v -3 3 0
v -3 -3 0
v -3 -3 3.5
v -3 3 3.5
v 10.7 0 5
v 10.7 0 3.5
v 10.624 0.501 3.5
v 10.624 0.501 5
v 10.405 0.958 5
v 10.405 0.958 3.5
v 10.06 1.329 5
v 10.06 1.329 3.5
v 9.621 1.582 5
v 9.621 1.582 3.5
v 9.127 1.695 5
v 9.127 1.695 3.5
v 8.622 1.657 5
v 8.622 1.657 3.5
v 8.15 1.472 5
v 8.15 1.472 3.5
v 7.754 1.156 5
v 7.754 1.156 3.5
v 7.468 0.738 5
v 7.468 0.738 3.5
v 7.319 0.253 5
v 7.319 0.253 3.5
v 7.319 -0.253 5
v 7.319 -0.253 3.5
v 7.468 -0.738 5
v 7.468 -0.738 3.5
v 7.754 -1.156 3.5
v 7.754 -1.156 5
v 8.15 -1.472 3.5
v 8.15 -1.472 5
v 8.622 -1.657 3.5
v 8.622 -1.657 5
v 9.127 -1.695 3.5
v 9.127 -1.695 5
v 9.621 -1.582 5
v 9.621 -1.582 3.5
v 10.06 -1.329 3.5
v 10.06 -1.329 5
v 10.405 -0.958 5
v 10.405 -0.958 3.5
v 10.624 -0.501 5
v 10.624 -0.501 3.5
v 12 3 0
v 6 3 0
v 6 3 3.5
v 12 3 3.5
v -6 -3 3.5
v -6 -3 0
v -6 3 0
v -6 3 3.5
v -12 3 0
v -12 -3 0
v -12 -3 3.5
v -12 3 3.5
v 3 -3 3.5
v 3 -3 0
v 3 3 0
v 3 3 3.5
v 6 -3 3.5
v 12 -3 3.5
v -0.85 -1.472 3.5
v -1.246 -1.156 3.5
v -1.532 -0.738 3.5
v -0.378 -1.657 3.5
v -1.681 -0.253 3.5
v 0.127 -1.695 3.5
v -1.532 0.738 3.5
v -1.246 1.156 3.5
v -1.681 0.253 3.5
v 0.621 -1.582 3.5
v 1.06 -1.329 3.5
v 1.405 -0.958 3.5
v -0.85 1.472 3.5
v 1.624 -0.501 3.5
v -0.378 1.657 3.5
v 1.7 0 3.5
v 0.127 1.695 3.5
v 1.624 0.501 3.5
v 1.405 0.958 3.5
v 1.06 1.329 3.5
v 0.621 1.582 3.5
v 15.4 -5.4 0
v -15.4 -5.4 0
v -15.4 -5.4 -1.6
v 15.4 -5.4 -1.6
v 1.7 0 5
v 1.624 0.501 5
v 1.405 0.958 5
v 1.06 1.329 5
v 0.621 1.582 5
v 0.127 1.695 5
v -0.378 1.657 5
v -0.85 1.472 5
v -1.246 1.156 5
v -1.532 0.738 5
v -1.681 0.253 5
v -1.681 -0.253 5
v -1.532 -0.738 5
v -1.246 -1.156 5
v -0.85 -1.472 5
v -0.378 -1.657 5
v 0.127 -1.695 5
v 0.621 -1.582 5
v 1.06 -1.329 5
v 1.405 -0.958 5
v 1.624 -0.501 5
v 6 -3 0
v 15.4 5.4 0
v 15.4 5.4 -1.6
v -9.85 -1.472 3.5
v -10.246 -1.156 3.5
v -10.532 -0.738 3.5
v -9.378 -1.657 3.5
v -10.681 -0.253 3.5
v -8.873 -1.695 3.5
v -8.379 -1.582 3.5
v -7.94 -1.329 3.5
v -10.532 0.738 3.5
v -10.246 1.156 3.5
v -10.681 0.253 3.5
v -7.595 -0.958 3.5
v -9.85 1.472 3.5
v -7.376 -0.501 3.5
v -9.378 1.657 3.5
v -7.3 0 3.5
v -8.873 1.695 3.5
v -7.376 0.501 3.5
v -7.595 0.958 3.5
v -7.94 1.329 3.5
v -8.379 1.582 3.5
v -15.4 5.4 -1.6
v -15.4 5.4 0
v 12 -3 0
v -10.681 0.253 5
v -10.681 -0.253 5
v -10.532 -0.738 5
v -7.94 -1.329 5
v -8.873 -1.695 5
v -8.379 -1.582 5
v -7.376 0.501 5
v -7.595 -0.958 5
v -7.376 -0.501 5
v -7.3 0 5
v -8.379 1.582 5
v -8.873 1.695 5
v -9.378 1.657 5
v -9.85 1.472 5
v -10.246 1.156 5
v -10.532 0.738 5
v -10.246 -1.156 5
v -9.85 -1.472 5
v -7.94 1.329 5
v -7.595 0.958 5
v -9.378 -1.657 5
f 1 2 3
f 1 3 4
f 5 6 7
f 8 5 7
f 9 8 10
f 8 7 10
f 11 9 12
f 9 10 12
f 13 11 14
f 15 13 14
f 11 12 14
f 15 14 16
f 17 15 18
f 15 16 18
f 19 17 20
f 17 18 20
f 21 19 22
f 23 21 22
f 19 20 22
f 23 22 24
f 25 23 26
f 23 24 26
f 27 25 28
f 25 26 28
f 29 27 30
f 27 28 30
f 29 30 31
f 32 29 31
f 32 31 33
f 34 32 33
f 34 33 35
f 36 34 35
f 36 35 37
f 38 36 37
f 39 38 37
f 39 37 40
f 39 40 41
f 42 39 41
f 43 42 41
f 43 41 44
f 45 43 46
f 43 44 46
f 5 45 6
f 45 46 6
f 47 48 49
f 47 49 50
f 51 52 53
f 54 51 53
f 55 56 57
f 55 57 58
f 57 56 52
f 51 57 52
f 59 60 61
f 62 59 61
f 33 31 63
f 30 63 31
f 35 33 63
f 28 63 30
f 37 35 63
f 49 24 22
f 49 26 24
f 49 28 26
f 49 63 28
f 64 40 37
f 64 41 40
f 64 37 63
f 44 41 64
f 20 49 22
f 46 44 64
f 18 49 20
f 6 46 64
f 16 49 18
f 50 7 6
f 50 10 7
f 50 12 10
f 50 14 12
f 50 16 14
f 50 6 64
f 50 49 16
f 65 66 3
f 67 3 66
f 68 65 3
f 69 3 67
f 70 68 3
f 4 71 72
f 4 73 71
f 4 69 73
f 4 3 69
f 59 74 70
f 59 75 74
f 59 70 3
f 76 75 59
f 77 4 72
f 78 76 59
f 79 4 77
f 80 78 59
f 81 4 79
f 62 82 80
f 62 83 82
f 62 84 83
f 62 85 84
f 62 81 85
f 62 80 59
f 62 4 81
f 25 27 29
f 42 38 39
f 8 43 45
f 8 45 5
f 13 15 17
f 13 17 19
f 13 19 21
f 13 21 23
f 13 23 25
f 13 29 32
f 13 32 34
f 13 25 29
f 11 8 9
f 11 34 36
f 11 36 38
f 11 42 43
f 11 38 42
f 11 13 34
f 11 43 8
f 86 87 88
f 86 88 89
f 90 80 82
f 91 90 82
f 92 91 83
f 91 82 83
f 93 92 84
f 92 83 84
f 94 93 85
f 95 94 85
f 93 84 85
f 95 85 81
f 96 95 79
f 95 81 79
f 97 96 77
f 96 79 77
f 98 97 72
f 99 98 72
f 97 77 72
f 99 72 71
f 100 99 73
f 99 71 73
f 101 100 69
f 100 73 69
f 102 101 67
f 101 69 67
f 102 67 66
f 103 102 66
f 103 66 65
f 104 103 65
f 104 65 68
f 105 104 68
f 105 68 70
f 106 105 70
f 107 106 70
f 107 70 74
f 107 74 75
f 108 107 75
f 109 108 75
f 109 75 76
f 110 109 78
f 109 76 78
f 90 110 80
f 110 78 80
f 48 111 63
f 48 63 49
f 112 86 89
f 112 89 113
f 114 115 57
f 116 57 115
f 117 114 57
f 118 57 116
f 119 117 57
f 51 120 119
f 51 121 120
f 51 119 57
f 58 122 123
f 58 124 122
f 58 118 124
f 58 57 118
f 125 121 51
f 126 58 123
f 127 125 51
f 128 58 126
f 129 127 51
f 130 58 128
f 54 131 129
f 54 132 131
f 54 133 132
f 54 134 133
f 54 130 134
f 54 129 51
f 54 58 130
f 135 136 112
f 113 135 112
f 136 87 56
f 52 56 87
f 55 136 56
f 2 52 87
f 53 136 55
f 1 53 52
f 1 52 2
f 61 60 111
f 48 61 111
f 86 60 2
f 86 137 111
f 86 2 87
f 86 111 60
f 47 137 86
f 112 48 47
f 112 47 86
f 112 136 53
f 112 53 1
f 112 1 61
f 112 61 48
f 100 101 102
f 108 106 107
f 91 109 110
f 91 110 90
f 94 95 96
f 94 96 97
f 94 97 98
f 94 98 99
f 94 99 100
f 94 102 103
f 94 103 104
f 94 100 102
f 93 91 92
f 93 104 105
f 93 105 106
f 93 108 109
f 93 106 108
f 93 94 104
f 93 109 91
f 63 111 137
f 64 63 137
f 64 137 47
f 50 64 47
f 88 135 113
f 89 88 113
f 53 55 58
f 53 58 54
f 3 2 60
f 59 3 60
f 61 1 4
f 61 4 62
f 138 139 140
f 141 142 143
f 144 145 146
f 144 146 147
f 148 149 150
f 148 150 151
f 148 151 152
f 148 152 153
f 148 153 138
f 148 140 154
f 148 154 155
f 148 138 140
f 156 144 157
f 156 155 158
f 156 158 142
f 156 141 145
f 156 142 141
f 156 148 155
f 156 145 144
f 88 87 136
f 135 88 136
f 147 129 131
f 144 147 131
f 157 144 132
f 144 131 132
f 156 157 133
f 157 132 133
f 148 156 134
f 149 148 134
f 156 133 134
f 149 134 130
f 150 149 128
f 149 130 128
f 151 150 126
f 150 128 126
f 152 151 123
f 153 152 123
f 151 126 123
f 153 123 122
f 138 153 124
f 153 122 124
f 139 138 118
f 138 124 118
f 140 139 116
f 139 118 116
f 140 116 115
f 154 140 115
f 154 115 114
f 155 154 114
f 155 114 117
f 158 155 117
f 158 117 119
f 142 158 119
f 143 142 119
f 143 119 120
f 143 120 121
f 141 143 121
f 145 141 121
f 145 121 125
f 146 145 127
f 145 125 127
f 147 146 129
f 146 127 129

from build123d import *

# Parameters (mm, degrees)
SKETCH_W     = 30.8
SKETCH_H     = 10.8
PAD_DEPTH    = 1.6
SKETCH001_W  = 6
SKETCH001_H  = 6
PAD001_DEPTH = 3.5
SKETCH002_R  = 1.7
PAD002_DEPTH = 1.5


with BuildPart() as part:
    # Sketch → Pad (new body)
    with BuildSketch(Plane.XY):
        Rectangle(SKETCH_W, SKETCH_H)
    extrude(amount=-PAD_DEPTH)

    # Sketch001 → Pad001 (new body)
    with BuildSketch(Plane.XY):
        with Locations((-9, 0)):
            Rectangle(SKETCH001_W, SKETCH001_H)
        Rectangle(SKETCH001_W, SKETCH001_H)
        with Locations((9, 0)):
            Rectangle(SKETCH001_W, SKETCH001_H)
    extrude(amount=PAD001_DEPTH)

    # Sketch002 → Pad002 (new body)
    with BuildSketch(Plane.XY.offset(3.5)):
        with Locations((-9, 0)):
            Circle(SKETCH002_R)
        Circle(SKETCH002_R)
        with Locations((9, 0)):
            Circle(SKETCH002_R)
    extrude(amount=PAD002_DEPTH)


solid = part.part
